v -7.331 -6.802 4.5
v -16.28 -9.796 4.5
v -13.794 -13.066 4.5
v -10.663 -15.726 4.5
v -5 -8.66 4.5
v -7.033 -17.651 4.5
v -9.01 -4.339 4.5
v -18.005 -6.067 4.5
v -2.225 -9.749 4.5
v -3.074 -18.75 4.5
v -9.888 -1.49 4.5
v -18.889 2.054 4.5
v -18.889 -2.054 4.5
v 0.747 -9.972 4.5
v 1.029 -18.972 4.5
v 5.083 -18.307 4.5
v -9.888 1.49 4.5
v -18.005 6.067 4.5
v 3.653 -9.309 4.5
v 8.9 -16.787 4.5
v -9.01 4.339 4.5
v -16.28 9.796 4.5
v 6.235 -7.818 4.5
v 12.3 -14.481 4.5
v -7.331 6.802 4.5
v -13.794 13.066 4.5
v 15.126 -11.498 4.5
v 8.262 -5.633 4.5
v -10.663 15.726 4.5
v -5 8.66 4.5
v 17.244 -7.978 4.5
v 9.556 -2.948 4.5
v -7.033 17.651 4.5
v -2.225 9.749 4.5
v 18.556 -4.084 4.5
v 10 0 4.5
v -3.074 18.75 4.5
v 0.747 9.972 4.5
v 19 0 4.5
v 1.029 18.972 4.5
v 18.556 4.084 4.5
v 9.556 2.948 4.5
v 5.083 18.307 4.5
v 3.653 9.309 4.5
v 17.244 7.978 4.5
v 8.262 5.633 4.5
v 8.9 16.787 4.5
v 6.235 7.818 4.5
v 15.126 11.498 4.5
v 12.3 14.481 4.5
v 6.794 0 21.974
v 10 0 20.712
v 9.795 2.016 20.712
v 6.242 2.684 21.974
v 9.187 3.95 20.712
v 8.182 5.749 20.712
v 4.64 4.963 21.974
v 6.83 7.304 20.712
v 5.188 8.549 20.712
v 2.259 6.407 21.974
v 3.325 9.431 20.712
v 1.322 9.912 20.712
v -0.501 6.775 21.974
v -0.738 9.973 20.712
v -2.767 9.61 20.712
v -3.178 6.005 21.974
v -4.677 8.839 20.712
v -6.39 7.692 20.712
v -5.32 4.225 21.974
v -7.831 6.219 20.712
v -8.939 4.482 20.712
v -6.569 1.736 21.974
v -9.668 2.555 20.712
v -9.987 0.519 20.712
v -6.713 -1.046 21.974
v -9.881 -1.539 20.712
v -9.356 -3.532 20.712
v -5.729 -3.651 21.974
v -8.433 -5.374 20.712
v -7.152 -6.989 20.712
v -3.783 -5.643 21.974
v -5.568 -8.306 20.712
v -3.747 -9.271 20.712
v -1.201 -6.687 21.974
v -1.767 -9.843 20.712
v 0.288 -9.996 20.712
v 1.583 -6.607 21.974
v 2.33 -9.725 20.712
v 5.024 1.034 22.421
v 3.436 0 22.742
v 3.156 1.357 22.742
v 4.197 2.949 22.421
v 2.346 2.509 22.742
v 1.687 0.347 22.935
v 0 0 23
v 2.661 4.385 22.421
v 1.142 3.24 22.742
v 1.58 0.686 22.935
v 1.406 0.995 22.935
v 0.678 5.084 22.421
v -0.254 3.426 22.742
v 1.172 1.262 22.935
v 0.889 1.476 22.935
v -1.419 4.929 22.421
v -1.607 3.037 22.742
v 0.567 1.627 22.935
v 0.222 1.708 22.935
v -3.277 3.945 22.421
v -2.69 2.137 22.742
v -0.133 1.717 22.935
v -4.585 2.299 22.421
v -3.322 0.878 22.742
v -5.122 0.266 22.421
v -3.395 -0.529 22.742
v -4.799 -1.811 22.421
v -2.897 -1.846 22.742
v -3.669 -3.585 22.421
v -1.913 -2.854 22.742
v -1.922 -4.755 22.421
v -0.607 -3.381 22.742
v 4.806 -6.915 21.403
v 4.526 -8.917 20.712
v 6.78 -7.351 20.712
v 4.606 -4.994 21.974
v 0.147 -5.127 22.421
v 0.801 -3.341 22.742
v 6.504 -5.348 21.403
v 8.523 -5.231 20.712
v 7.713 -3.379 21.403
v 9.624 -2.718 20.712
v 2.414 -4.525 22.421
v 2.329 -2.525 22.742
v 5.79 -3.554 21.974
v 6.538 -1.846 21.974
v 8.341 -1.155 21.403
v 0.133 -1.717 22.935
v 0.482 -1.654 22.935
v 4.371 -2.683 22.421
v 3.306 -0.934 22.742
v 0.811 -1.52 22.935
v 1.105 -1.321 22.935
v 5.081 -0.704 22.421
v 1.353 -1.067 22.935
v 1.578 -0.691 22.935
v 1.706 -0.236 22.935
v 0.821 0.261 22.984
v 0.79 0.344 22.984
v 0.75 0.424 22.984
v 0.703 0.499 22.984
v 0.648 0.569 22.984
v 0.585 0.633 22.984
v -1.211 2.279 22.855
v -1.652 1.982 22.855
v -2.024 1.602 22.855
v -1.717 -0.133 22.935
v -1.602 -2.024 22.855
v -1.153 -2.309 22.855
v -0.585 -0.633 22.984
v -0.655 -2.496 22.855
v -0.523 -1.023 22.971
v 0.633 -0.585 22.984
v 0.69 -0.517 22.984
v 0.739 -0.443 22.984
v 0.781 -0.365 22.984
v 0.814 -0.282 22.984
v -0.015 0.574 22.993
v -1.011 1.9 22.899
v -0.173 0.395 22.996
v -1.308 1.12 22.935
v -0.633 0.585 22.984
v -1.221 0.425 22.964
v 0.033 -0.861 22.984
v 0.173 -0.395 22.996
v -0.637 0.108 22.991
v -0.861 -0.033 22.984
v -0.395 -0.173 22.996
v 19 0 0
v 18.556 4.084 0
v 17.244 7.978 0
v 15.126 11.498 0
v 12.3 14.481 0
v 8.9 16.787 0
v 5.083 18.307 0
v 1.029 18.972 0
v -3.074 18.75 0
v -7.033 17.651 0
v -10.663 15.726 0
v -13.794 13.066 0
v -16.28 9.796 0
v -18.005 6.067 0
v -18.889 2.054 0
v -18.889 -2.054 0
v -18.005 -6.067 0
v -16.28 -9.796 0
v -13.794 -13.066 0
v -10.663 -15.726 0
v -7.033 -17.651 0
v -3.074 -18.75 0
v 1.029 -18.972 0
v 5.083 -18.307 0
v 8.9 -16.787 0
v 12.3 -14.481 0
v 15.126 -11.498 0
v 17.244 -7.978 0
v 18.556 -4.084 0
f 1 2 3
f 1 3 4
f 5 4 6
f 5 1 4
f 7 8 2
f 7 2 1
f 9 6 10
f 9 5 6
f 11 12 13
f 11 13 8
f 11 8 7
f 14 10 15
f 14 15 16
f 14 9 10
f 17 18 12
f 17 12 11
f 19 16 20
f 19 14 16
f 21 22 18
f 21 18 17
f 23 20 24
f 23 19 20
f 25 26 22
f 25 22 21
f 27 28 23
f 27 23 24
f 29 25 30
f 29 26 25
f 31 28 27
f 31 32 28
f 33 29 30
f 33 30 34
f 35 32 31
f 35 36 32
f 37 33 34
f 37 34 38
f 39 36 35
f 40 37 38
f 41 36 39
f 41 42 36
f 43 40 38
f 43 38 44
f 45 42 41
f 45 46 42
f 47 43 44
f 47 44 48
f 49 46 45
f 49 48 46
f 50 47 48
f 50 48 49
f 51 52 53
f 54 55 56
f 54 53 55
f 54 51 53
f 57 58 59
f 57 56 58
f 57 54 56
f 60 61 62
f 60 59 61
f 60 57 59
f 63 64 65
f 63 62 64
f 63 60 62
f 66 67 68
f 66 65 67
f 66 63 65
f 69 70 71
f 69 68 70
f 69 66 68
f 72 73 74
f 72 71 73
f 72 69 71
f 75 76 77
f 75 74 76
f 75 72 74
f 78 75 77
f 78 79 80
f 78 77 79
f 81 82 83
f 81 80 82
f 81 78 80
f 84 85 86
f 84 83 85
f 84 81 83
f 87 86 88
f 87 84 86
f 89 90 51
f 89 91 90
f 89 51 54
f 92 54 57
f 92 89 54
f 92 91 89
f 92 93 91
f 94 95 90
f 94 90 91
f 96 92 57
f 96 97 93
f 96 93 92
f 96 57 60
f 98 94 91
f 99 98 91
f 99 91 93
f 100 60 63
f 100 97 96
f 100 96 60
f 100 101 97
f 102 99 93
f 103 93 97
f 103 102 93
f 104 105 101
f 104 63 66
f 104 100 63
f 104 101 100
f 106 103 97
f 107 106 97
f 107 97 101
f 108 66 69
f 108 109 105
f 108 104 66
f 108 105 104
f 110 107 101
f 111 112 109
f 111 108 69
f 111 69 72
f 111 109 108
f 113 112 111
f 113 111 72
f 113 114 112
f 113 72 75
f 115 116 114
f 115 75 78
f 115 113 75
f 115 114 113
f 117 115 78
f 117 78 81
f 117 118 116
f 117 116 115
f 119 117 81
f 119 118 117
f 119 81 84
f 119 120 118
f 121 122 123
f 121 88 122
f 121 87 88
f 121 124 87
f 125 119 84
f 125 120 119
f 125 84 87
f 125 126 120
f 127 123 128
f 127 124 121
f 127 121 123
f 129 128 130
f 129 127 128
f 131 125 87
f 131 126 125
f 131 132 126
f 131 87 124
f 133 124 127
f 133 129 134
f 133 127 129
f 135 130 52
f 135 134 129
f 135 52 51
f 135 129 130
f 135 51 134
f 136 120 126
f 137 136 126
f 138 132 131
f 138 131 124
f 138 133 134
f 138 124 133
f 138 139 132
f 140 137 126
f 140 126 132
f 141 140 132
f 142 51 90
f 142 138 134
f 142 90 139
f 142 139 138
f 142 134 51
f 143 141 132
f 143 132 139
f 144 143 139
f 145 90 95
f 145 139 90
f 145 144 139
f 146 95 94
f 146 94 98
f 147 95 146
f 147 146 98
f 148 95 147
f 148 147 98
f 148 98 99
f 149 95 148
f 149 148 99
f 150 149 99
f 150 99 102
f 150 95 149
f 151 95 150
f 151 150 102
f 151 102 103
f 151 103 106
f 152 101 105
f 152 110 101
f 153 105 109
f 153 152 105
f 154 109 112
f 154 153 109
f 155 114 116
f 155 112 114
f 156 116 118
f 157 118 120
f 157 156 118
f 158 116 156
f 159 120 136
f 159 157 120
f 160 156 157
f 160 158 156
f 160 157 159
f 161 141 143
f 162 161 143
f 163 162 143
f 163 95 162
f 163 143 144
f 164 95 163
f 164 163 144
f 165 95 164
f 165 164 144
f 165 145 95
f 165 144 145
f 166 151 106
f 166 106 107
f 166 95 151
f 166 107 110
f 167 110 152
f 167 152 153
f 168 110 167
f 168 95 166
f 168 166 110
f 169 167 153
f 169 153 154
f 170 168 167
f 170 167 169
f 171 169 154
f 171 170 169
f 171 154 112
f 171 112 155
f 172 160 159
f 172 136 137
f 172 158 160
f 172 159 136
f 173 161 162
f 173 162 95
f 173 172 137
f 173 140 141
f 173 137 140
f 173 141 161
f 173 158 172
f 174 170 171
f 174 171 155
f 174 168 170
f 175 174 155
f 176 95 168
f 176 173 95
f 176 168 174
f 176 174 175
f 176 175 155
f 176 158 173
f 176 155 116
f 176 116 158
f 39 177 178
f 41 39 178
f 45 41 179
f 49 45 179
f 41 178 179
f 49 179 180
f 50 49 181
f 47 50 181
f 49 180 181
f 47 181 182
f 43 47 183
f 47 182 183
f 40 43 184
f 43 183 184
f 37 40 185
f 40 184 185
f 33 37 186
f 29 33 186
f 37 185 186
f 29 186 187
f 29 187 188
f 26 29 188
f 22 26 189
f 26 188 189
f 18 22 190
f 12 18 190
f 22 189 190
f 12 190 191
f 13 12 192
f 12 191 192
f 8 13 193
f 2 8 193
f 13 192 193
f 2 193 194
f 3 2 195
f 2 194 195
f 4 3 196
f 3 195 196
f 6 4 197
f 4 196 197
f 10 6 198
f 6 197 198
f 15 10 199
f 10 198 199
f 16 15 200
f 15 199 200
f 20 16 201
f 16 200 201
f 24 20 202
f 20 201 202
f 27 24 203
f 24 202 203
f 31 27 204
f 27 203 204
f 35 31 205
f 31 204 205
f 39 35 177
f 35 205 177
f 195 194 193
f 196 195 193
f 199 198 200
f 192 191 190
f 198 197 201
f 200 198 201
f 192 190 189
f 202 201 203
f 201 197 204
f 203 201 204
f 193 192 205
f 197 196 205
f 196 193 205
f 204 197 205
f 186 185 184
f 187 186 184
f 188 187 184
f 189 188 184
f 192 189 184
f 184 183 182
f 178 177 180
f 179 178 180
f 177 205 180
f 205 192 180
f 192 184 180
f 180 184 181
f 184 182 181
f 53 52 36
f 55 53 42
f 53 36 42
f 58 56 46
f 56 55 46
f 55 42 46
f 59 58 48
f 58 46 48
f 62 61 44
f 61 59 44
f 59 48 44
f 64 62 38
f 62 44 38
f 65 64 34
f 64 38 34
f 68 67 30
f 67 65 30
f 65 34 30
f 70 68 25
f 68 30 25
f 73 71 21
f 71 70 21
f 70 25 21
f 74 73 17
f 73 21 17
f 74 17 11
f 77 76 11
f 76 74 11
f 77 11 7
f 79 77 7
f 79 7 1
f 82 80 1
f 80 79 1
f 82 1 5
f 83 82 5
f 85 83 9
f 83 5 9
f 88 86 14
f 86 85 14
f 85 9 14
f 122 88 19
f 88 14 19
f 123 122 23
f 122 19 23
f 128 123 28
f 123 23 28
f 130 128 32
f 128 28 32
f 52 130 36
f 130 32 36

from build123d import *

# Parameters (mm, degrees)
CYLINDER001_R     = 19
CYLINDER001_DEPTH = 4.5
CYLINDER_R        = 10
CYLINDER_DEPTH    = 27


with BuildPart() as cilindro001:
    # Cylinder001 → Cylinder001 (new body)
    with BuildSketch(Plane.XY):
        Circle(CYLINDER001_R)
    extrude(amount=CYLINDER001_DEPTH)


with BuildPart() as cilindro:
    # Cylinder → Cylinder (new body)
    with BuildSketch(Plane.XY):
        Circle(CYLINDER_R)
    extrude(amount=CYLINDER_DEPTH)


with BuildPart() as fusion:
    # Sphere → Sphere (revolve)
    with BuildSketch(Plane.XZ):
        with BuildLine():
            ThreePointArc((23, 0), (16.263456, 16.263456), (0, 23))
            Line((0, 23), (0, 0))
            Line((0, 0), (23, 0))
        make_face()
    revolve(axis=Axis((0, 0, 0), (0, 0, 1)))

    # Common: intersect Cilindro
    add(cilindro.part, mode=Mode.INTERSECT)

    # Fusion: union Cilindro001
    add(cilindro001.part)


solid = fusion.part
